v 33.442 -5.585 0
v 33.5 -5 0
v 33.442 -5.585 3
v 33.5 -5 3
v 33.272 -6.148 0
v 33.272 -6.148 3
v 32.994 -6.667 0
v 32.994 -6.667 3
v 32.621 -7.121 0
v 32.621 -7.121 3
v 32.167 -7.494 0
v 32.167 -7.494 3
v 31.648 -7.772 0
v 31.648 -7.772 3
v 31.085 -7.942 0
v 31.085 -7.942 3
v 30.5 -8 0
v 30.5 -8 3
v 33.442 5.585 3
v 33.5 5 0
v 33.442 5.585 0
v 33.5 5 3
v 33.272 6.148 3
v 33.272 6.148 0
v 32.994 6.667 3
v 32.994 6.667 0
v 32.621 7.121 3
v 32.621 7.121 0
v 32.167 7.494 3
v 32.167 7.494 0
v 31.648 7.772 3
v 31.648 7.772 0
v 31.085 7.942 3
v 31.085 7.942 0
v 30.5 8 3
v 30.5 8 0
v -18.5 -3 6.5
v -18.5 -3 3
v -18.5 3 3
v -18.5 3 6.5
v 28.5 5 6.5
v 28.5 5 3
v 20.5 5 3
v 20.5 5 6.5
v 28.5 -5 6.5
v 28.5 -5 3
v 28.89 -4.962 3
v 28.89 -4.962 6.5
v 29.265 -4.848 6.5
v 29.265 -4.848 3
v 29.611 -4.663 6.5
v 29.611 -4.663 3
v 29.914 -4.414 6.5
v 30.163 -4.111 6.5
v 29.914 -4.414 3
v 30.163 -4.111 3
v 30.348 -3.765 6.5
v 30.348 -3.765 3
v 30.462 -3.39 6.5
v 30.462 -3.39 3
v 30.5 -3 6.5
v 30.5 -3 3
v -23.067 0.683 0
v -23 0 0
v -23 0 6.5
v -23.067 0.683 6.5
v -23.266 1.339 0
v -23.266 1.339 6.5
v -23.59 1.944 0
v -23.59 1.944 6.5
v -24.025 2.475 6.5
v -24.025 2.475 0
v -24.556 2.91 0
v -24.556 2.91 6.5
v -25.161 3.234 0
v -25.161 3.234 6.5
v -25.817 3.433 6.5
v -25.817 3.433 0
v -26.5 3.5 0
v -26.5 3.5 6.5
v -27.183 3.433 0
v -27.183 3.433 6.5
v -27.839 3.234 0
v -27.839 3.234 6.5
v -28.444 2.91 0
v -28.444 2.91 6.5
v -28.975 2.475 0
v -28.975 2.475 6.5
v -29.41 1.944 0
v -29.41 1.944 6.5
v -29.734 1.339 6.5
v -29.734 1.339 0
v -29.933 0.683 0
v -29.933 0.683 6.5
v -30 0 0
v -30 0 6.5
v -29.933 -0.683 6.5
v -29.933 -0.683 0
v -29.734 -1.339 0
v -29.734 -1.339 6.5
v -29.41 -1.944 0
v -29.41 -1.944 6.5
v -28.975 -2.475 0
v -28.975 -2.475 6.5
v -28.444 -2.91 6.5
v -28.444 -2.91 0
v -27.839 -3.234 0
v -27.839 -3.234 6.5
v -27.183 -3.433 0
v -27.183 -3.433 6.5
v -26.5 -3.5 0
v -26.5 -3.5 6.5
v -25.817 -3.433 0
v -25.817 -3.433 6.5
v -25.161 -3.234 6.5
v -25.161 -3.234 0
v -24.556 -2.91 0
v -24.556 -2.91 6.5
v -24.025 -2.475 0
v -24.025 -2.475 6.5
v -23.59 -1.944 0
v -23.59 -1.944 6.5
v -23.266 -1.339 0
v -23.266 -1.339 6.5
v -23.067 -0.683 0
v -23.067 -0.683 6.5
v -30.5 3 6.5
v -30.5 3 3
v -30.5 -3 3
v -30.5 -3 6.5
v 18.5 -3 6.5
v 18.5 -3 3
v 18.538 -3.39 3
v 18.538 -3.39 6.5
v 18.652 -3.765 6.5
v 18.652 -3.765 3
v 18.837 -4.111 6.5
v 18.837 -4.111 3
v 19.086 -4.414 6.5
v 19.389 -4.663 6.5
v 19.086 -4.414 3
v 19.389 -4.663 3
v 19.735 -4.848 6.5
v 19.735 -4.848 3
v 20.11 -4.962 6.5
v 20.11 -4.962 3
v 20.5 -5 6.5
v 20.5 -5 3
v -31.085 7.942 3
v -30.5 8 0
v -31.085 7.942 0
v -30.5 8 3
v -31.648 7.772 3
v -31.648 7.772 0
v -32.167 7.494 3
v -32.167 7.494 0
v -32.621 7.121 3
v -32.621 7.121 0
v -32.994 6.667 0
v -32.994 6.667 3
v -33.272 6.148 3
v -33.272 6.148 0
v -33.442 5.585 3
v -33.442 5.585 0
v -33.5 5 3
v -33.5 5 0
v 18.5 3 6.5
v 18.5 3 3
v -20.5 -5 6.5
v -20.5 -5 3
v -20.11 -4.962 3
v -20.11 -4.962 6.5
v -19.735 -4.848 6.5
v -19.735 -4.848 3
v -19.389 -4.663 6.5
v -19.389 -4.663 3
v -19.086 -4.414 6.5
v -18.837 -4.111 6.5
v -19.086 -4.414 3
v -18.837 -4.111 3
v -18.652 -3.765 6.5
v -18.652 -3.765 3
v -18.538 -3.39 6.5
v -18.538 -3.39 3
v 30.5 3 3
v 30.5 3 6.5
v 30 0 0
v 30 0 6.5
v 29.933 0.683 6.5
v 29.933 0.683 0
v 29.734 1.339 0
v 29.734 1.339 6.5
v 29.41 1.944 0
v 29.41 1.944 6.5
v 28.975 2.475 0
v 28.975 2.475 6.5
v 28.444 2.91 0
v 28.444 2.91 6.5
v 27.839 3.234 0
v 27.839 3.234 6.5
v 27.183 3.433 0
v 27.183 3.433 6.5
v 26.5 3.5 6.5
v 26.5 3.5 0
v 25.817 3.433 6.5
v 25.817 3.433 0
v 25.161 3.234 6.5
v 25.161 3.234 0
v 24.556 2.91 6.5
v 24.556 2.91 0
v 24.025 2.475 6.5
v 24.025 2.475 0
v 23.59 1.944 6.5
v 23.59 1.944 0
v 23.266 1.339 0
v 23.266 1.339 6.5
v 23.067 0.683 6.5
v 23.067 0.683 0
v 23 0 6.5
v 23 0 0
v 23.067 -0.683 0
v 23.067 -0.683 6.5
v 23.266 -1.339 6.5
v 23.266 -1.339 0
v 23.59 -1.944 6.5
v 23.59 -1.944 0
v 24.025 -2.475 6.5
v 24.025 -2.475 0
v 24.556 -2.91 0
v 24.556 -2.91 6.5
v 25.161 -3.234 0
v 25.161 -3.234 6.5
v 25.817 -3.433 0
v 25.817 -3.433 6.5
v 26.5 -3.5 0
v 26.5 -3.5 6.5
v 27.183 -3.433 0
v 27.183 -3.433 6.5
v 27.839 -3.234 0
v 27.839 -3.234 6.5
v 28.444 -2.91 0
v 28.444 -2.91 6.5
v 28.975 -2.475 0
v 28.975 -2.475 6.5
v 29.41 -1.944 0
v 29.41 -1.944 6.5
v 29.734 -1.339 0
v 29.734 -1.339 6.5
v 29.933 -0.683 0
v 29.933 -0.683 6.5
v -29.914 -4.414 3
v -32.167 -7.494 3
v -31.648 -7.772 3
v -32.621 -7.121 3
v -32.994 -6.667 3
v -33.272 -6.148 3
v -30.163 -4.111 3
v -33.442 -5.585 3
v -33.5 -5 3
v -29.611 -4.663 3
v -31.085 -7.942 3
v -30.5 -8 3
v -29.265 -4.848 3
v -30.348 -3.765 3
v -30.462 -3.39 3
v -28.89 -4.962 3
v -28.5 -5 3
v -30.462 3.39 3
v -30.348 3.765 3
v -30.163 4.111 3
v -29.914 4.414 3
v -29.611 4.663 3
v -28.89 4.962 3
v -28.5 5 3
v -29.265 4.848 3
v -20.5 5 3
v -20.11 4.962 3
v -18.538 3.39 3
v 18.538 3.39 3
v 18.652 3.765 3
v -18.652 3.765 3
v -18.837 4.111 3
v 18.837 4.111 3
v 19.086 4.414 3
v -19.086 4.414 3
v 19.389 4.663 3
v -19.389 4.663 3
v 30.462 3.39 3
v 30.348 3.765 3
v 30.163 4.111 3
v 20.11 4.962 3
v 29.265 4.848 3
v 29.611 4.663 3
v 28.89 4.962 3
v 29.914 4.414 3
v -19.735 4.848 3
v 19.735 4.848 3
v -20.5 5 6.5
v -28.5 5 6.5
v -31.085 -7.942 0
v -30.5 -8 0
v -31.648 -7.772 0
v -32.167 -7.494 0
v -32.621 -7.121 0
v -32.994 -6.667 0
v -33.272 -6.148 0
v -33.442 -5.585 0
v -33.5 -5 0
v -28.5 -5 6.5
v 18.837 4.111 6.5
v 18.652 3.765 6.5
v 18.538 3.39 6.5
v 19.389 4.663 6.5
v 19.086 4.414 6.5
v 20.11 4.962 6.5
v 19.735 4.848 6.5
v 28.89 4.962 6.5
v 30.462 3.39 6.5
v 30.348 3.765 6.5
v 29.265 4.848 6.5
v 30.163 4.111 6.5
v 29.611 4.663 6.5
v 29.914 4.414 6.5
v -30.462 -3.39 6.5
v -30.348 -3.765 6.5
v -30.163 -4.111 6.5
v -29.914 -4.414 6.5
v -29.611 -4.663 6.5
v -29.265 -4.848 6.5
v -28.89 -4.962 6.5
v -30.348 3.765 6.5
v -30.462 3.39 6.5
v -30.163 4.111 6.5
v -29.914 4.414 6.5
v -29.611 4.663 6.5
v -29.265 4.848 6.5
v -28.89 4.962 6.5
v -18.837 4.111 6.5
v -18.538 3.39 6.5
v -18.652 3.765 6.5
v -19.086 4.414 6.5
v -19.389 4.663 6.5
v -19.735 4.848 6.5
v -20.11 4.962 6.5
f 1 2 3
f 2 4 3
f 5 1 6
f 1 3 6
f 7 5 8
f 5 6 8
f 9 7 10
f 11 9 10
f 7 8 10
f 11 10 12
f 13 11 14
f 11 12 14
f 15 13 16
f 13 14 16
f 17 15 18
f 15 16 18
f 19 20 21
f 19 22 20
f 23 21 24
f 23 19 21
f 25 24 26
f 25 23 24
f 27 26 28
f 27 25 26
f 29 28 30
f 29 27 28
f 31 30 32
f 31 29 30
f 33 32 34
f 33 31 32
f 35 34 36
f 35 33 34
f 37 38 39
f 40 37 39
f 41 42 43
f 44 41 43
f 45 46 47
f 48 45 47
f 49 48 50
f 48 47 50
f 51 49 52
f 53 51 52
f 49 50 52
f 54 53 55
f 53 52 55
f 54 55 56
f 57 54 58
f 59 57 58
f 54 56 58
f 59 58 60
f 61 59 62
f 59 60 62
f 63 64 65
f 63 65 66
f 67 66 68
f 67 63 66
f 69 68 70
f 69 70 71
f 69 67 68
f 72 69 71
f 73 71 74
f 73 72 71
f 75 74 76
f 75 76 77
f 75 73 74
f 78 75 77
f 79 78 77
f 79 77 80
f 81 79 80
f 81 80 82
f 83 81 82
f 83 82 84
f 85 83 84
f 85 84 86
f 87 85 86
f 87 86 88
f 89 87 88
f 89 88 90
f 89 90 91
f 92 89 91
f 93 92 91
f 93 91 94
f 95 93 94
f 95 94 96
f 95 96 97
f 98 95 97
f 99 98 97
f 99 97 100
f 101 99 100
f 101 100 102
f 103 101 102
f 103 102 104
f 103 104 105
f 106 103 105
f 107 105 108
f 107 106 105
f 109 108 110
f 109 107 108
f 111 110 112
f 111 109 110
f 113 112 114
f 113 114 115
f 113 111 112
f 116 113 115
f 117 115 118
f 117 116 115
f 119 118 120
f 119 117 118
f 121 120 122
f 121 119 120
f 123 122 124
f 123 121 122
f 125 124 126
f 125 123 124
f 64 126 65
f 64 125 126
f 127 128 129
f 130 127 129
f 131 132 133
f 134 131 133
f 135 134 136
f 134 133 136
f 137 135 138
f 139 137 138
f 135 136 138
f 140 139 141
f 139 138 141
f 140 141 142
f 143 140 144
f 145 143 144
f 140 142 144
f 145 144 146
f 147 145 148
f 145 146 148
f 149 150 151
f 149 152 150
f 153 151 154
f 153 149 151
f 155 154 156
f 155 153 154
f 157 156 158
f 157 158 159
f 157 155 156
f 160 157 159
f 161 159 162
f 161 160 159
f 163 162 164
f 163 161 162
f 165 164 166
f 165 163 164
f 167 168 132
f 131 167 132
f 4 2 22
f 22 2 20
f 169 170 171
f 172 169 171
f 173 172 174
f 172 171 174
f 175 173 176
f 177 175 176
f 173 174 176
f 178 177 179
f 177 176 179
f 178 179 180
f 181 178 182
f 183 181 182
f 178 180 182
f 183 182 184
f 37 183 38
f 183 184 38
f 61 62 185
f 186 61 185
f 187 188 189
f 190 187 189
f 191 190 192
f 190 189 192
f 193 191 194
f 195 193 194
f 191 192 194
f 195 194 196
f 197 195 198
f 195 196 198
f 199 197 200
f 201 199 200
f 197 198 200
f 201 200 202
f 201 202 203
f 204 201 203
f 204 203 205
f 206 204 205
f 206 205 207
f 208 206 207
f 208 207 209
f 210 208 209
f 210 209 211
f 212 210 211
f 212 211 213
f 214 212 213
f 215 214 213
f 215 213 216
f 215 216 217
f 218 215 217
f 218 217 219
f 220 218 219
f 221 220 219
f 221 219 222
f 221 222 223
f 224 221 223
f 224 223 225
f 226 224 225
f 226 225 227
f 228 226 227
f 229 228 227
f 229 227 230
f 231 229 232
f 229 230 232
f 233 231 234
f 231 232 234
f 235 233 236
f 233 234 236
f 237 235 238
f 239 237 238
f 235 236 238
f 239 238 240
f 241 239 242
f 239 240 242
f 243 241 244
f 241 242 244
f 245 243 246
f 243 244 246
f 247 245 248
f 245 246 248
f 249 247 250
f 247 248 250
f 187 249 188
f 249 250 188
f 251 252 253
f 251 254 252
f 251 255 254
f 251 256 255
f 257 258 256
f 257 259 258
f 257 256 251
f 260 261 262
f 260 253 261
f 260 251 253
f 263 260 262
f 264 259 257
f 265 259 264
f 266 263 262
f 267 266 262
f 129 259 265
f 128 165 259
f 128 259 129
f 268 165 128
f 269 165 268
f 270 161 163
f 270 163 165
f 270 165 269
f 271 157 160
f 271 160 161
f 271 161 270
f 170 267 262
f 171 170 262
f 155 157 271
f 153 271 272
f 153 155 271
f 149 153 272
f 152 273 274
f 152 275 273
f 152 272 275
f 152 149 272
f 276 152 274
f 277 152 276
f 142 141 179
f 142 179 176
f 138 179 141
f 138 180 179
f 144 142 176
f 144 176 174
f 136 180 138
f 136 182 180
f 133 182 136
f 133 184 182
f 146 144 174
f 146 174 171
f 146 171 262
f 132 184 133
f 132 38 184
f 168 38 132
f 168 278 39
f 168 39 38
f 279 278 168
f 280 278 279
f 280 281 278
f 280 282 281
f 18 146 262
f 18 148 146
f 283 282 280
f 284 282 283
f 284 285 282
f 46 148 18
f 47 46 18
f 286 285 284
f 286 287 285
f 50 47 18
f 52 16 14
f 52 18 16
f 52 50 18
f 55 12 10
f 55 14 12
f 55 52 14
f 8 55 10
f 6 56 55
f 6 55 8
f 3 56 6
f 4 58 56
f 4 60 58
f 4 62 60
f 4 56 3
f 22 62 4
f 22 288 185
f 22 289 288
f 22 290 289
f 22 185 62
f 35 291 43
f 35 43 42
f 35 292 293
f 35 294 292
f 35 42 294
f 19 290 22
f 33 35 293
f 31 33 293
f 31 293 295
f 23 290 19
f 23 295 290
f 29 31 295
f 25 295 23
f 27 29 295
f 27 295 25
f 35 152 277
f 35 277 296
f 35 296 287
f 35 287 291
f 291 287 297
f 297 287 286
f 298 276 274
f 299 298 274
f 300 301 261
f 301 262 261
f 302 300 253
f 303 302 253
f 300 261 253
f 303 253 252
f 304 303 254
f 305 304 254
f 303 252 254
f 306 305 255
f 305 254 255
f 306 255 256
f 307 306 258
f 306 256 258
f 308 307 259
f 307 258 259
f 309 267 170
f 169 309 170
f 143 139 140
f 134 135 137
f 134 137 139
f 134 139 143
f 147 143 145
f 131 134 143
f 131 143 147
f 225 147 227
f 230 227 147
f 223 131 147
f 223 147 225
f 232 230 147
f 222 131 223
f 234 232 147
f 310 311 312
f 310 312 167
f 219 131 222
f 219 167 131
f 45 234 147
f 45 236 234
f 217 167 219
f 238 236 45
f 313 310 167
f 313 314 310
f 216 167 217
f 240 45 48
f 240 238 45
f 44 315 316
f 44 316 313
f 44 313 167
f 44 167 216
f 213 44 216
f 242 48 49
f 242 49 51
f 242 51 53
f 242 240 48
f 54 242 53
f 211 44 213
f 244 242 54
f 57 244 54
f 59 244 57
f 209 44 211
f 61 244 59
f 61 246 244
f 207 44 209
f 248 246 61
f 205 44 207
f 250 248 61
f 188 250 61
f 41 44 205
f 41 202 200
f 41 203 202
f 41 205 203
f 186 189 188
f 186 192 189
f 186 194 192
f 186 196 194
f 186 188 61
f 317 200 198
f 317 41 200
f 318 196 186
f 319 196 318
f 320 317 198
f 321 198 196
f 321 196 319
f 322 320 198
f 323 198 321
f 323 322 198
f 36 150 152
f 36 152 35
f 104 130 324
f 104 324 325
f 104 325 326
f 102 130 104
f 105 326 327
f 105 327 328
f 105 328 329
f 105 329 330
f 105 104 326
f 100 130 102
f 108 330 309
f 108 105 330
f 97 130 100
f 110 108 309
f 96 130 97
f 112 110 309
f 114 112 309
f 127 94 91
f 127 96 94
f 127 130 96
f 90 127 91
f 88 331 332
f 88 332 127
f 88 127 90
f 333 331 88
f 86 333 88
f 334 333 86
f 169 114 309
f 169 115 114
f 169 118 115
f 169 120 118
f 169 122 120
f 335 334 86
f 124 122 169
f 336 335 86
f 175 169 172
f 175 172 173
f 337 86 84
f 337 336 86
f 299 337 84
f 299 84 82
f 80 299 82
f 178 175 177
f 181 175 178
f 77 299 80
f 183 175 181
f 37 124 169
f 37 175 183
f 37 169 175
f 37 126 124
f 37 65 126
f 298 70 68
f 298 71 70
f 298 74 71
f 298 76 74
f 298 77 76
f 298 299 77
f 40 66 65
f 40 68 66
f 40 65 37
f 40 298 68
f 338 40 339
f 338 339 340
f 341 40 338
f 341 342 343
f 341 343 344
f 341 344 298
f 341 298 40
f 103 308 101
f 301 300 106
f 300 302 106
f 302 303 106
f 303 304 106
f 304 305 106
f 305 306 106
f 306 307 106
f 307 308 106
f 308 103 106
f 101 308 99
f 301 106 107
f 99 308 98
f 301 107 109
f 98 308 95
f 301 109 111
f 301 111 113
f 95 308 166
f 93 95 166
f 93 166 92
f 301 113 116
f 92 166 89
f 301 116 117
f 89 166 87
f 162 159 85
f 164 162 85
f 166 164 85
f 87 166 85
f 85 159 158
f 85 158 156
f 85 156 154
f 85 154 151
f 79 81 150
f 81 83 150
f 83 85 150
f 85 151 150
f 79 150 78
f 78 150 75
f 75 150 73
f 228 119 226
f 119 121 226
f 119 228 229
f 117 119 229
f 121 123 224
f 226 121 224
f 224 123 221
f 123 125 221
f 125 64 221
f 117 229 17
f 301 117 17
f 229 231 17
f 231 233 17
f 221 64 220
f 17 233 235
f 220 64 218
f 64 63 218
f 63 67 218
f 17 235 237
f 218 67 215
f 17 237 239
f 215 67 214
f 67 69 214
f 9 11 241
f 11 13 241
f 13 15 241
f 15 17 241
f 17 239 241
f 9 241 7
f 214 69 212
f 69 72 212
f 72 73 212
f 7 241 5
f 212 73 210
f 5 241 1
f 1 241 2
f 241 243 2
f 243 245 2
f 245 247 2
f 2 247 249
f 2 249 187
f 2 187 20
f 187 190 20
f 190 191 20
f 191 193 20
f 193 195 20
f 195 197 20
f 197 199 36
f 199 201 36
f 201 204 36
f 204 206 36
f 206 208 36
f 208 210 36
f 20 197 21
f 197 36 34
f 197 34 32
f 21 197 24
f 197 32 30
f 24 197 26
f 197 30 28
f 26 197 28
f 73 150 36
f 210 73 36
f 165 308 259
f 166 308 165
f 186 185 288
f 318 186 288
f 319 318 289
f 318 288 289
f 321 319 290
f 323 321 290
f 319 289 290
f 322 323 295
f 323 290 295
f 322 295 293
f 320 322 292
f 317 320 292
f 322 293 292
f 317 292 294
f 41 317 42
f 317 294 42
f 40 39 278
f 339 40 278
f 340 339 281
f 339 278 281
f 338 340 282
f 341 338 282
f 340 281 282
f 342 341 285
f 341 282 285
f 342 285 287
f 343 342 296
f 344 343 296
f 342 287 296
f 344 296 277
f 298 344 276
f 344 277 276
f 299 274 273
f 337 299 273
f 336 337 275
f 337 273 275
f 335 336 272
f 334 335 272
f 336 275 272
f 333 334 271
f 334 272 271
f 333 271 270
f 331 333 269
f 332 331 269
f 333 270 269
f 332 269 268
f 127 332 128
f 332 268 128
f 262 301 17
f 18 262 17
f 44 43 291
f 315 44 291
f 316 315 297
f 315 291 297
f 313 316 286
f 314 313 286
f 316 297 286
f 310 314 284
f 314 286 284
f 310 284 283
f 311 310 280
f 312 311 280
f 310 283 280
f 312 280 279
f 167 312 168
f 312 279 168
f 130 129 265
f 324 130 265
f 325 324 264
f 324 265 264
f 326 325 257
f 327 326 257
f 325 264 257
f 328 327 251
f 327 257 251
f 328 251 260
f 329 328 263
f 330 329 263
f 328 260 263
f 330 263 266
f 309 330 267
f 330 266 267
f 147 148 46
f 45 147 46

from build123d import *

# Parameters (mm, degrees)
F0_W     = 67
F0_H     = 16
F0_R     = 3.5
F1_DEPTH = 3
F3_DEPTH = 3.5
F4_R     = 3.5
F5_DEPTH = 6.501
F6_R     = 3


with BuildPart() as f1:
    # F0 (on Top) → F1 (new body)
    with BuildSketch(Plane.XY):
        Rectangle(F0_W, F0_H)
        with Locations((-26.5, 0)):
            Circle(F0_R, mode=Mode.SUBTRACT)
        with Locations((26.5, 0)):
            Circle(F0_R, mode=Mode.SUBTRACT)
    extrude(amount=F1_DEPTH)

    # F2 (on face) → F3 (join)
    with BuildSketch(Plane.XY.offset(3)):
        with BuildLine():
            Line((20.5, -5), (28.5, -5))
            ThreePointArc((28.5, -5), (29.914214, -4.414214), (30.5, -3))
            Line((30.5, -3), (30.5, 3))
            ThreePointArc((30.5, 3), (29.914214, 4.414214), (28.5, 5))
            Line((28.5, 5), (20.5, 5))
            ThreePointArc((20.5, 5), (19.085786, 4.414214), (18.5, 3))
            Line((18.5, 3), (18.5, -3))
            ThreePointArc((18.5, -3), (19.085786, -4.414214), (20.5, -5))
        make_face()
        with BuildLine():
            Line((-28.5, -5), (-20.5, -5))
            ThreePointArc((-20.5, -5), (-19.085786, -4.414214), (-18.5, -3))
            Line((-18.5, -3), (-18.5, 3))
            ThreePointArc((-18.5, 3), (-19.085786, 4.414214), (-20.5, 5))
            Line((-20.5, 5), (-28.5, 5))
            ThreePointArc((-28.5, 5), (-29.914214, 4.414214), (-30.5, 3))
            Line((-30.5, 3), (-30.5, -3))
            ThreePointArc((-30.5, -3), (-29.914214, -4.414214), (-28.5, -5))
        make_face()
    extrude(amount=F3_DEPTH)

    # F4 (on face) → F5 (cut, through all)
    with BuildSketch(Plane.XY.offset(6.5)):
        with Locations((26.5, 0)):
            Circle(F4_R)
        with Locations((-26.5, 0)):
            Circle(F4_R)
    extrude(amount=-F5_DEPTH, mode=Mode.SUBTRACT)

    # F6
    f6_edges = [f1.edges().sort_by_distance(p)[0] for p in [
        (-33.5, 8, 1.5),
        (33.5, 8, 1.5),
        (33.5, -8, 1.5),
        (-33.5, -8, 1.5),
    ]]
    fillet(f6_edges, radius=F6_R)


solid = f1.part
